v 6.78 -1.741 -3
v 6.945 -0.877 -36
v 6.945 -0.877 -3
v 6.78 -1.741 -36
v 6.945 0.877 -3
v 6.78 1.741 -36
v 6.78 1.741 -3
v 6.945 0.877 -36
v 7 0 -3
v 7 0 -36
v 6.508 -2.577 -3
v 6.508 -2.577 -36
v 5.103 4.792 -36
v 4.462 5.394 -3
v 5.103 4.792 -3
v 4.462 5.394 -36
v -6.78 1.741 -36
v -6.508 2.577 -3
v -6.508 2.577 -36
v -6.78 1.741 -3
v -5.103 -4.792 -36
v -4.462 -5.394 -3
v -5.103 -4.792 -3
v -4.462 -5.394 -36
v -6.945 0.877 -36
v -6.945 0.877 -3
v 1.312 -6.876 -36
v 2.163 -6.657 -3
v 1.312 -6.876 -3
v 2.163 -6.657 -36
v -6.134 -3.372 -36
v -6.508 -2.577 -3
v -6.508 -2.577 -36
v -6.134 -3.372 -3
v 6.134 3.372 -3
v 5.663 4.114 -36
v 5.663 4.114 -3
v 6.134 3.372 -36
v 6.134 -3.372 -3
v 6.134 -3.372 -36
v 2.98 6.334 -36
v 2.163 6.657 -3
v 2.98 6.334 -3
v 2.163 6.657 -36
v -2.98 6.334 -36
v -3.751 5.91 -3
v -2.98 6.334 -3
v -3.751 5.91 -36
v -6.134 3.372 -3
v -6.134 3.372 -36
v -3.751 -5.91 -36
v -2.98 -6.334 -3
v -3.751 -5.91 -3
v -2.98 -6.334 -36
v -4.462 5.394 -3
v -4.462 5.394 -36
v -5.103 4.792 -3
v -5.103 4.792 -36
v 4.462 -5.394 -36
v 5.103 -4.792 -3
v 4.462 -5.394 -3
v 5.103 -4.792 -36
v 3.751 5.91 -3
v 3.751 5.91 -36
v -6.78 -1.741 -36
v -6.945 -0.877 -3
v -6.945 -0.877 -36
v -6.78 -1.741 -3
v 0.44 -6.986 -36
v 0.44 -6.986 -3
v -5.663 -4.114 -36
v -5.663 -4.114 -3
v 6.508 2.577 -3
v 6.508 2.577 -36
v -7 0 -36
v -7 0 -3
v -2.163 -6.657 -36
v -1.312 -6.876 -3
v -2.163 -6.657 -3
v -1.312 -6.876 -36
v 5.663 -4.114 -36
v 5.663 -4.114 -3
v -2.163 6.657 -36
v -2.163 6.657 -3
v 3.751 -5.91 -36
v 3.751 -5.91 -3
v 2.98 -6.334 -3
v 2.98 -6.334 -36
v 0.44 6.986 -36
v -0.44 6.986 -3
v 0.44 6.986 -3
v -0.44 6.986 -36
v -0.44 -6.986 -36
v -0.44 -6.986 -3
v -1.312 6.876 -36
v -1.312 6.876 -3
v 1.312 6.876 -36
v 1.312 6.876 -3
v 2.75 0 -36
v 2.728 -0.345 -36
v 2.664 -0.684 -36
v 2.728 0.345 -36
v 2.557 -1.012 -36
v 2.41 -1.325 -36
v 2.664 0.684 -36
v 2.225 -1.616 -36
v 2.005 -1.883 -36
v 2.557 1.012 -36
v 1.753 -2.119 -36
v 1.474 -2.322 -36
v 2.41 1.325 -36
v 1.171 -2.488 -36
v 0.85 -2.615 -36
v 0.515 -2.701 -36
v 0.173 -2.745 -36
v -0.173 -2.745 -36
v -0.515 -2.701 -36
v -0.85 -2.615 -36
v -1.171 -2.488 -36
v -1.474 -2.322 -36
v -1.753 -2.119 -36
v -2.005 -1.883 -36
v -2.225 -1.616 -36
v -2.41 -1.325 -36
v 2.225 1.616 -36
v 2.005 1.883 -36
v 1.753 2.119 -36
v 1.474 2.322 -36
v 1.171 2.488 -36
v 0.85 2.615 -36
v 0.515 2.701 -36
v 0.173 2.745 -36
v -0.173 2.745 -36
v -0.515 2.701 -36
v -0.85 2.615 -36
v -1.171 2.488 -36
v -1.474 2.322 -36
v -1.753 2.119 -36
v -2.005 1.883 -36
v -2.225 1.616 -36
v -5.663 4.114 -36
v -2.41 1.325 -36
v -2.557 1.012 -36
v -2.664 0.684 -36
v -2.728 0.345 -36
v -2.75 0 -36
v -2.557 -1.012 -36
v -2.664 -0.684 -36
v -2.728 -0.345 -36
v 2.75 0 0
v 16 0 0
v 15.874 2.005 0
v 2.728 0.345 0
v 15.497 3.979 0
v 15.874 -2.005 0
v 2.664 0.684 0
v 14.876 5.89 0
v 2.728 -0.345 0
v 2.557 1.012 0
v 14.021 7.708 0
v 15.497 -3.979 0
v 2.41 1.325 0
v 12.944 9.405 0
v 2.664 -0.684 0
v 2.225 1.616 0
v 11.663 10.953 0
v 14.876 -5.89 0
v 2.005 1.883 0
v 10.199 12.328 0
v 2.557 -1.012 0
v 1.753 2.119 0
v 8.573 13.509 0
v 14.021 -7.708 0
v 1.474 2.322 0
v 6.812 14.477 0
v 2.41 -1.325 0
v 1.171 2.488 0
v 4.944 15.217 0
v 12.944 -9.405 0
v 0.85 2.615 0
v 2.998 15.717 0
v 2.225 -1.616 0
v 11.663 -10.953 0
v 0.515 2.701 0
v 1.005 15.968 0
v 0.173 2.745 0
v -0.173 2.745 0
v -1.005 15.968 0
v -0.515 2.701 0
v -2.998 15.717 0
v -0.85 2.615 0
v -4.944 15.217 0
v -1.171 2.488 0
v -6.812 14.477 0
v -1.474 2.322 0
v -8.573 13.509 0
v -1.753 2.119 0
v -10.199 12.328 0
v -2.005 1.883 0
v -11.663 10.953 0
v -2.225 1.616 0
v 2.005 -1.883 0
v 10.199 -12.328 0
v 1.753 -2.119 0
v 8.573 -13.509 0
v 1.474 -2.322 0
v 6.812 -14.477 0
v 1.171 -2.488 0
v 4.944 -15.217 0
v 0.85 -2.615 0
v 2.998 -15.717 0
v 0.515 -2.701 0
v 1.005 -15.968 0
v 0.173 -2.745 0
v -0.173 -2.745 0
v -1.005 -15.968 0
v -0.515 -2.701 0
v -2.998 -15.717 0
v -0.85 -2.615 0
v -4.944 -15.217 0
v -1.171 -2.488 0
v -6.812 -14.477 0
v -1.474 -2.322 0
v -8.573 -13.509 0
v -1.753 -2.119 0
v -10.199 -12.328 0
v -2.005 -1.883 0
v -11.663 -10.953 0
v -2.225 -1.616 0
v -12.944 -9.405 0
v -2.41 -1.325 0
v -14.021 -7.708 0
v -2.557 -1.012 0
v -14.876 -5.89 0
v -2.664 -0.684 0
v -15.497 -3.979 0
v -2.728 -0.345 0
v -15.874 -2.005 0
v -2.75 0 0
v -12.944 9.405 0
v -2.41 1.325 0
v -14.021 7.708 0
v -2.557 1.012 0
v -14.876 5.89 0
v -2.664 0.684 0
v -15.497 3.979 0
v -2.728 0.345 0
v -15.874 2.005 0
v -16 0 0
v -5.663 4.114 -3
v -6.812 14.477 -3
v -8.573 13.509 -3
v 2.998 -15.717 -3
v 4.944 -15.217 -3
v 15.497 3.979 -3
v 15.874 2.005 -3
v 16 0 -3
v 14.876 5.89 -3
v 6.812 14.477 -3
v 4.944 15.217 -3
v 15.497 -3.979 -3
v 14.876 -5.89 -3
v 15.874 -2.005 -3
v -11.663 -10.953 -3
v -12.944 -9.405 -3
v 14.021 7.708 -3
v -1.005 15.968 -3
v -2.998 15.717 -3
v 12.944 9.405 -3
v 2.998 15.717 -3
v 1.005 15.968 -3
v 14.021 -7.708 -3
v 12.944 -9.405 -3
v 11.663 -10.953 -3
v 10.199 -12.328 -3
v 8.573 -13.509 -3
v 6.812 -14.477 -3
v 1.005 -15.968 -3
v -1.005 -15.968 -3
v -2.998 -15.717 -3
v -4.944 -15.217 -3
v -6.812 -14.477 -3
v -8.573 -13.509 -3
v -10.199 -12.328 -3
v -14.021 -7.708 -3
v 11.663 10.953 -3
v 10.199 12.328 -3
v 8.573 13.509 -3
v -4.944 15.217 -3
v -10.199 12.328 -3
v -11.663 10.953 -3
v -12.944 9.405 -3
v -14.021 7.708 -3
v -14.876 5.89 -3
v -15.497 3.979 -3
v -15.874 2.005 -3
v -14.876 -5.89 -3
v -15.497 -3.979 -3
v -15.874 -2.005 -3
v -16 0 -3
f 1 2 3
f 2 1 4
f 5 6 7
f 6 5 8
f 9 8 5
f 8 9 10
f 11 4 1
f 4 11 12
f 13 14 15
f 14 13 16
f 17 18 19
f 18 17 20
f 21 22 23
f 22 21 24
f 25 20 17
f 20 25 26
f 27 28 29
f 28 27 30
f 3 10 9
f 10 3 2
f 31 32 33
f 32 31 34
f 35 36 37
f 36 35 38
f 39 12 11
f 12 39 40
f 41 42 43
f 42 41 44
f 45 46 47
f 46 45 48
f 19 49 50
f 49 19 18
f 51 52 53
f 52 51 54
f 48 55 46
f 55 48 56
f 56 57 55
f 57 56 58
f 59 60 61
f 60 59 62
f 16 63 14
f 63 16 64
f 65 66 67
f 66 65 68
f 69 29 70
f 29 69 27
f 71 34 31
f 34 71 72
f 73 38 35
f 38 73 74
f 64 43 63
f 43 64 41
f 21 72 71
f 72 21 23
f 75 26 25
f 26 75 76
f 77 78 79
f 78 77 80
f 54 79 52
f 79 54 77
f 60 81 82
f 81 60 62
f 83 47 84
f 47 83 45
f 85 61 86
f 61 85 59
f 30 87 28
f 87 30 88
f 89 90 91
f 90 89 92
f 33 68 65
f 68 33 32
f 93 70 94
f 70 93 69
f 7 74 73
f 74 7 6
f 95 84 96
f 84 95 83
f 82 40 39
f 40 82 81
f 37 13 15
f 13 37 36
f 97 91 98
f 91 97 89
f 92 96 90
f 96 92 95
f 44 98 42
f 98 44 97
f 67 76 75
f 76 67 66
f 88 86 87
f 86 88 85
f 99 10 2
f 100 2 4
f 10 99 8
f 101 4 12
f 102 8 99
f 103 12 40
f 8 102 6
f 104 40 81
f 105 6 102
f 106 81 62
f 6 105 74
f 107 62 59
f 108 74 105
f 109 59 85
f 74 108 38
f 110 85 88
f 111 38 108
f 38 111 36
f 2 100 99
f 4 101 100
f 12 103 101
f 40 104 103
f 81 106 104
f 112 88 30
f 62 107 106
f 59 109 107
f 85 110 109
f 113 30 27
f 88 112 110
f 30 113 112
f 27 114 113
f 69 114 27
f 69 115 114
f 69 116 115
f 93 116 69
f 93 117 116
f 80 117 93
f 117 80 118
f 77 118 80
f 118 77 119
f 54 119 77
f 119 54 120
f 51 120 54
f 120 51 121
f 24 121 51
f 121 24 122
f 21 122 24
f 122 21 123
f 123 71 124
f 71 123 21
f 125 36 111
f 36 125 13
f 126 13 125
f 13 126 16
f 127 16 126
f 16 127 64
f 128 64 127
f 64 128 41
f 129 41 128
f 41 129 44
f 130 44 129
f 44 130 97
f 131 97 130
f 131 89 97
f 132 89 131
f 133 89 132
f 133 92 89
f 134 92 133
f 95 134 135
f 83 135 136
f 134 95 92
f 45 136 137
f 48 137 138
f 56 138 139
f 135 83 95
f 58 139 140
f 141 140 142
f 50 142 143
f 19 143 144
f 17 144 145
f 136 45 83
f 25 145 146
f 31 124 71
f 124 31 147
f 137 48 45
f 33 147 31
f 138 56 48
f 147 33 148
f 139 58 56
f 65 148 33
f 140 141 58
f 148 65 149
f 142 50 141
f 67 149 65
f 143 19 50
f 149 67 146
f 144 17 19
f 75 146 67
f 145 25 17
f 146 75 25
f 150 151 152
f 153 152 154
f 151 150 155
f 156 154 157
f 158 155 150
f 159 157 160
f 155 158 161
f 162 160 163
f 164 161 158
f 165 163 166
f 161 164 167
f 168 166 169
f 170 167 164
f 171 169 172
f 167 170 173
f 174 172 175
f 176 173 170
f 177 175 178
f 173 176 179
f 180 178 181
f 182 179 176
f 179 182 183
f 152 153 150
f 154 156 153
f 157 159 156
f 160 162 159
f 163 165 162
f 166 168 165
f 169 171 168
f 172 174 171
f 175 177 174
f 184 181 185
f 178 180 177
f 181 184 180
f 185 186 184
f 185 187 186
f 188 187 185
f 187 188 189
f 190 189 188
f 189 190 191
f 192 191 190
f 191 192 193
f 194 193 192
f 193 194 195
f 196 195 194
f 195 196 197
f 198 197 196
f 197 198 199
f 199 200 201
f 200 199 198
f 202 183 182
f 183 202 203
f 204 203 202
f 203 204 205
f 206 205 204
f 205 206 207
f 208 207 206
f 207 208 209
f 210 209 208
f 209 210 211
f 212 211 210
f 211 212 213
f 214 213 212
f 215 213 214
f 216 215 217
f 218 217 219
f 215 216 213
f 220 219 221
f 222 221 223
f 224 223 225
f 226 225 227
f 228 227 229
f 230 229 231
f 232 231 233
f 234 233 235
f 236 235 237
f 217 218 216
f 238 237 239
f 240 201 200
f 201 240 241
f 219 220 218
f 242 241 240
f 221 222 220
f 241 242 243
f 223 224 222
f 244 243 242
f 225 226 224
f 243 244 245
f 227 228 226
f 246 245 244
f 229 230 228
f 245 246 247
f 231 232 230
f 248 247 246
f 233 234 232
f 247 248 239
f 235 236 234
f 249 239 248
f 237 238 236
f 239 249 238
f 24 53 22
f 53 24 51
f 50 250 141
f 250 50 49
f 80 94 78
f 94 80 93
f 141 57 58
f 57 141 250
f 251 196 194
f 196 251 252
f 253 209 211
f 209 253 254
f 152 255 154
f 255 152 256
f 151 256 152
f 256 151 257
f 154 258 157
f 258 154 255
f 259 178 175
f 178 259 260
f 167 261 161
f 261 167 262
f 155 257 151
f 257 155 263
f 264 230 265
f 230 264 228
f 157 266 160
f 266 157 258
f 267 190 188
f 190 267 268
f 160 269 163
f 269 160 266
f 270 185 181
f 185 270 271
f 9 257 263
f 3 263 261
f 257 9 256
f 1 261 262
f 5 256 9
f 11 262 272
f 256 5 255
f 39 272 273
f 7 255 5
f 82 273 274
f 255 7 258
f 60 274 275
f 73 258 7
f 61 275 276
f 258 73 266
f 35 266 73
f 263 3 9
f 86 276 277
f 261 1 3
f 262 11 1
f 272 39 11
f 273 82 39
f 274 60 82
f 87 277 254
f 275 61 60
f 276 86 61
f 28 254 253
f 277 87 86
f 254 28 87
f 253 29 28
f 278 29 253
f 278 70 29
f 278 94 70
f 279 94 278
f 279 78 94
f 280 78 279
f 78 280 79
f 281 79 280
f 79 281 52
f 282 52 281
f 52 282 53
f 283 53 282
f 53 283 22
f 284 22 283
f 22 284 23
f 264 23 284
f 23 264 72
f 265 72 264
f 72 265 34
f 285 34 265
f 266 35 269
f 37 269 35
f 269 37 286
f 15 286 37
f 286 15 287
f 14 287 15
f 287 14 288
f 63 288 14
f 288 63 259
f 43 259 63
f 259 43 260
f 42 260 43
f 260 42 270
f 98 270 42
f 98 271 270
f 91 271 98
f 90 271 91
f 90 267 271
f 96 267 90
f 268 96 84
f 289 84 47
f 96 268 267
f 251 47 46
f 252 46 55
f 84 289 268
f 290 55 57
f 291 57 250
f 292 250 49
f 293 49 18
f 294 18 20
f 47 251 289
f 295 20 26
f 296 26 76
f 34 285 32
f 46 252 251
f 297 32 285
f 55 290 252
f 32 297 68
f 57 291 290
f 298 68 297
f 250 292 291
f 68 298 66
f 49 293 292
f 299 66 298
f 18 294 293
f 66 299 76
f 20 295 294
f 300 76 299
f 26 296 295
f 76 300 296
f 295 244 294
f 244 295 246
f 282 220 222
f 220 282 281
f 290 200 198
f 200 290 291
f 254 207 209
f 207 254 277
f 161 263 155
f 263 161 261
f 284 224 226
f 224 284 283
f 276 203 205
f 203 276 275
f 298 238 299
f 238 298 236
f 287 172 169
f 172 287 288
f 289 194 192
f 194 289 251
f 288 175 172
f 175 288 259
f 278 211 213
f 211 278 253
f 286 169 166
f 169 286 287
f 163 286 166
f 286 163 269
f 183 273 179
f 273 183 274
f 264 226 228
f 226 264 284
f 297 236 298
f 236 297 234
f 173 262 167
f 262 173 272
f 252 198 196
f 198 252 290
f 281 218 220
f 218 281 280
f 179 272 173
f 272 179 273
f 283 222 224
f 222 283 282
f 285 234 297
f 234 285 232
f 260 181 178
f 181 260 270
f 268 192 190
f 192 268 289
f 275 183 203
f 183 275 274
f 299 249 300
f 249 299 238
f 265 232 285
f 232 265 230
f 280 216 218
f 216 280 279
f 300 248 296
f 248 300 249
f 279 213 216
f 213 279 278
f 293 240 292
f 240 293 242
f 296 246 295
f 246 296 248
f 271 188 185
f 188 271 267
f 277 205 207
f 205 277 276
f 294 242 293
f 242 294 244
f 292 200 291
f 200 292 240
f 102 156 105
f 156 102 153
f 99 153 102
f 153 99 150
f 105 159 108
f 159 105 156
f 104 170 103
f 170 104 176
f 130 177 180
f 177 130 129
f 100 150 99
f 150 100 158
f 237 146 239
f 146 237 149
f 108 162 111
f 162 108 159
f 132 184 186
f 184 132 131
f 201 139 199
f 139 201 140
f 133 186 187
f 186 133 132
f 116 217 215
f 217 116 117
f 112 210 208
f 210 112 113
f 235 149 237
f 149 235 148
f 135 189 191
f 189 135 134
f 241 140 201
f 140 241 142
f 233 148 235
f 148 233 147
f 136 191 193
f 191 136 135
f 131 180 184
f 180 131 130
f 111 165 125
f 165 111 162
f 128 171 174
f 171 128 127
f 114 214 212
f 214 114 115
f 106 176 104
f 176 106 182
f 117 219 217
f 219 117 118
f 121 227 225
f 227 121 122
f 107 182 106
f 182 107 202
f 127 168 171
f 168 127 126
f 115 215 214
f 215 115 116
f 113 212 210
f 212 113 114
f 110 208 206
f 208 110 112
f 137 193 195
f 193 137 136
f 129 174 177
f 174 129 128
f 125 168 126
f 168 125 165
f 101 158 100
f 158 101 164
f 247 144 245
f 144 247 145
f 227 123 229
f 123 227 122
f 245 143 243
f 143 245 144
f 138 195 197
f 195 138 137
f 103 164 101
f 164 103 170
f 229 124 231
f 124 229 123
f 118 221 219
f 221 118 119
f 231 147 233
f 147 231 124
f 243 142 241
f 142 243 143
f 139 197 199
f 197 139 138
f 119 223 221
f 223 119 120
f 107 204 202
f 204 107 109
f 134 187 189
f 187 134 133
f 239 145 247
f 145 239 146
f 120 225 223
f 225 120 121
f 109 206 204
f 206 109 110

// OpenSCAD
$fn = 50;


difference() {
	union() {
		translate(v = [0, 0, -36.0000000000]) {
			cylinder(h = 36, r = 7.0000000000);
		}
		translate(v = [0, 0, -3.0000000000]) {
			cylinder(h = 3, r = 16.0000000000);
		}
	}
	union() {
		#translate(v = [0, 0, -36]) {
			cylinder(h = 36, r = 2.7500000000);
		}
	}
}
